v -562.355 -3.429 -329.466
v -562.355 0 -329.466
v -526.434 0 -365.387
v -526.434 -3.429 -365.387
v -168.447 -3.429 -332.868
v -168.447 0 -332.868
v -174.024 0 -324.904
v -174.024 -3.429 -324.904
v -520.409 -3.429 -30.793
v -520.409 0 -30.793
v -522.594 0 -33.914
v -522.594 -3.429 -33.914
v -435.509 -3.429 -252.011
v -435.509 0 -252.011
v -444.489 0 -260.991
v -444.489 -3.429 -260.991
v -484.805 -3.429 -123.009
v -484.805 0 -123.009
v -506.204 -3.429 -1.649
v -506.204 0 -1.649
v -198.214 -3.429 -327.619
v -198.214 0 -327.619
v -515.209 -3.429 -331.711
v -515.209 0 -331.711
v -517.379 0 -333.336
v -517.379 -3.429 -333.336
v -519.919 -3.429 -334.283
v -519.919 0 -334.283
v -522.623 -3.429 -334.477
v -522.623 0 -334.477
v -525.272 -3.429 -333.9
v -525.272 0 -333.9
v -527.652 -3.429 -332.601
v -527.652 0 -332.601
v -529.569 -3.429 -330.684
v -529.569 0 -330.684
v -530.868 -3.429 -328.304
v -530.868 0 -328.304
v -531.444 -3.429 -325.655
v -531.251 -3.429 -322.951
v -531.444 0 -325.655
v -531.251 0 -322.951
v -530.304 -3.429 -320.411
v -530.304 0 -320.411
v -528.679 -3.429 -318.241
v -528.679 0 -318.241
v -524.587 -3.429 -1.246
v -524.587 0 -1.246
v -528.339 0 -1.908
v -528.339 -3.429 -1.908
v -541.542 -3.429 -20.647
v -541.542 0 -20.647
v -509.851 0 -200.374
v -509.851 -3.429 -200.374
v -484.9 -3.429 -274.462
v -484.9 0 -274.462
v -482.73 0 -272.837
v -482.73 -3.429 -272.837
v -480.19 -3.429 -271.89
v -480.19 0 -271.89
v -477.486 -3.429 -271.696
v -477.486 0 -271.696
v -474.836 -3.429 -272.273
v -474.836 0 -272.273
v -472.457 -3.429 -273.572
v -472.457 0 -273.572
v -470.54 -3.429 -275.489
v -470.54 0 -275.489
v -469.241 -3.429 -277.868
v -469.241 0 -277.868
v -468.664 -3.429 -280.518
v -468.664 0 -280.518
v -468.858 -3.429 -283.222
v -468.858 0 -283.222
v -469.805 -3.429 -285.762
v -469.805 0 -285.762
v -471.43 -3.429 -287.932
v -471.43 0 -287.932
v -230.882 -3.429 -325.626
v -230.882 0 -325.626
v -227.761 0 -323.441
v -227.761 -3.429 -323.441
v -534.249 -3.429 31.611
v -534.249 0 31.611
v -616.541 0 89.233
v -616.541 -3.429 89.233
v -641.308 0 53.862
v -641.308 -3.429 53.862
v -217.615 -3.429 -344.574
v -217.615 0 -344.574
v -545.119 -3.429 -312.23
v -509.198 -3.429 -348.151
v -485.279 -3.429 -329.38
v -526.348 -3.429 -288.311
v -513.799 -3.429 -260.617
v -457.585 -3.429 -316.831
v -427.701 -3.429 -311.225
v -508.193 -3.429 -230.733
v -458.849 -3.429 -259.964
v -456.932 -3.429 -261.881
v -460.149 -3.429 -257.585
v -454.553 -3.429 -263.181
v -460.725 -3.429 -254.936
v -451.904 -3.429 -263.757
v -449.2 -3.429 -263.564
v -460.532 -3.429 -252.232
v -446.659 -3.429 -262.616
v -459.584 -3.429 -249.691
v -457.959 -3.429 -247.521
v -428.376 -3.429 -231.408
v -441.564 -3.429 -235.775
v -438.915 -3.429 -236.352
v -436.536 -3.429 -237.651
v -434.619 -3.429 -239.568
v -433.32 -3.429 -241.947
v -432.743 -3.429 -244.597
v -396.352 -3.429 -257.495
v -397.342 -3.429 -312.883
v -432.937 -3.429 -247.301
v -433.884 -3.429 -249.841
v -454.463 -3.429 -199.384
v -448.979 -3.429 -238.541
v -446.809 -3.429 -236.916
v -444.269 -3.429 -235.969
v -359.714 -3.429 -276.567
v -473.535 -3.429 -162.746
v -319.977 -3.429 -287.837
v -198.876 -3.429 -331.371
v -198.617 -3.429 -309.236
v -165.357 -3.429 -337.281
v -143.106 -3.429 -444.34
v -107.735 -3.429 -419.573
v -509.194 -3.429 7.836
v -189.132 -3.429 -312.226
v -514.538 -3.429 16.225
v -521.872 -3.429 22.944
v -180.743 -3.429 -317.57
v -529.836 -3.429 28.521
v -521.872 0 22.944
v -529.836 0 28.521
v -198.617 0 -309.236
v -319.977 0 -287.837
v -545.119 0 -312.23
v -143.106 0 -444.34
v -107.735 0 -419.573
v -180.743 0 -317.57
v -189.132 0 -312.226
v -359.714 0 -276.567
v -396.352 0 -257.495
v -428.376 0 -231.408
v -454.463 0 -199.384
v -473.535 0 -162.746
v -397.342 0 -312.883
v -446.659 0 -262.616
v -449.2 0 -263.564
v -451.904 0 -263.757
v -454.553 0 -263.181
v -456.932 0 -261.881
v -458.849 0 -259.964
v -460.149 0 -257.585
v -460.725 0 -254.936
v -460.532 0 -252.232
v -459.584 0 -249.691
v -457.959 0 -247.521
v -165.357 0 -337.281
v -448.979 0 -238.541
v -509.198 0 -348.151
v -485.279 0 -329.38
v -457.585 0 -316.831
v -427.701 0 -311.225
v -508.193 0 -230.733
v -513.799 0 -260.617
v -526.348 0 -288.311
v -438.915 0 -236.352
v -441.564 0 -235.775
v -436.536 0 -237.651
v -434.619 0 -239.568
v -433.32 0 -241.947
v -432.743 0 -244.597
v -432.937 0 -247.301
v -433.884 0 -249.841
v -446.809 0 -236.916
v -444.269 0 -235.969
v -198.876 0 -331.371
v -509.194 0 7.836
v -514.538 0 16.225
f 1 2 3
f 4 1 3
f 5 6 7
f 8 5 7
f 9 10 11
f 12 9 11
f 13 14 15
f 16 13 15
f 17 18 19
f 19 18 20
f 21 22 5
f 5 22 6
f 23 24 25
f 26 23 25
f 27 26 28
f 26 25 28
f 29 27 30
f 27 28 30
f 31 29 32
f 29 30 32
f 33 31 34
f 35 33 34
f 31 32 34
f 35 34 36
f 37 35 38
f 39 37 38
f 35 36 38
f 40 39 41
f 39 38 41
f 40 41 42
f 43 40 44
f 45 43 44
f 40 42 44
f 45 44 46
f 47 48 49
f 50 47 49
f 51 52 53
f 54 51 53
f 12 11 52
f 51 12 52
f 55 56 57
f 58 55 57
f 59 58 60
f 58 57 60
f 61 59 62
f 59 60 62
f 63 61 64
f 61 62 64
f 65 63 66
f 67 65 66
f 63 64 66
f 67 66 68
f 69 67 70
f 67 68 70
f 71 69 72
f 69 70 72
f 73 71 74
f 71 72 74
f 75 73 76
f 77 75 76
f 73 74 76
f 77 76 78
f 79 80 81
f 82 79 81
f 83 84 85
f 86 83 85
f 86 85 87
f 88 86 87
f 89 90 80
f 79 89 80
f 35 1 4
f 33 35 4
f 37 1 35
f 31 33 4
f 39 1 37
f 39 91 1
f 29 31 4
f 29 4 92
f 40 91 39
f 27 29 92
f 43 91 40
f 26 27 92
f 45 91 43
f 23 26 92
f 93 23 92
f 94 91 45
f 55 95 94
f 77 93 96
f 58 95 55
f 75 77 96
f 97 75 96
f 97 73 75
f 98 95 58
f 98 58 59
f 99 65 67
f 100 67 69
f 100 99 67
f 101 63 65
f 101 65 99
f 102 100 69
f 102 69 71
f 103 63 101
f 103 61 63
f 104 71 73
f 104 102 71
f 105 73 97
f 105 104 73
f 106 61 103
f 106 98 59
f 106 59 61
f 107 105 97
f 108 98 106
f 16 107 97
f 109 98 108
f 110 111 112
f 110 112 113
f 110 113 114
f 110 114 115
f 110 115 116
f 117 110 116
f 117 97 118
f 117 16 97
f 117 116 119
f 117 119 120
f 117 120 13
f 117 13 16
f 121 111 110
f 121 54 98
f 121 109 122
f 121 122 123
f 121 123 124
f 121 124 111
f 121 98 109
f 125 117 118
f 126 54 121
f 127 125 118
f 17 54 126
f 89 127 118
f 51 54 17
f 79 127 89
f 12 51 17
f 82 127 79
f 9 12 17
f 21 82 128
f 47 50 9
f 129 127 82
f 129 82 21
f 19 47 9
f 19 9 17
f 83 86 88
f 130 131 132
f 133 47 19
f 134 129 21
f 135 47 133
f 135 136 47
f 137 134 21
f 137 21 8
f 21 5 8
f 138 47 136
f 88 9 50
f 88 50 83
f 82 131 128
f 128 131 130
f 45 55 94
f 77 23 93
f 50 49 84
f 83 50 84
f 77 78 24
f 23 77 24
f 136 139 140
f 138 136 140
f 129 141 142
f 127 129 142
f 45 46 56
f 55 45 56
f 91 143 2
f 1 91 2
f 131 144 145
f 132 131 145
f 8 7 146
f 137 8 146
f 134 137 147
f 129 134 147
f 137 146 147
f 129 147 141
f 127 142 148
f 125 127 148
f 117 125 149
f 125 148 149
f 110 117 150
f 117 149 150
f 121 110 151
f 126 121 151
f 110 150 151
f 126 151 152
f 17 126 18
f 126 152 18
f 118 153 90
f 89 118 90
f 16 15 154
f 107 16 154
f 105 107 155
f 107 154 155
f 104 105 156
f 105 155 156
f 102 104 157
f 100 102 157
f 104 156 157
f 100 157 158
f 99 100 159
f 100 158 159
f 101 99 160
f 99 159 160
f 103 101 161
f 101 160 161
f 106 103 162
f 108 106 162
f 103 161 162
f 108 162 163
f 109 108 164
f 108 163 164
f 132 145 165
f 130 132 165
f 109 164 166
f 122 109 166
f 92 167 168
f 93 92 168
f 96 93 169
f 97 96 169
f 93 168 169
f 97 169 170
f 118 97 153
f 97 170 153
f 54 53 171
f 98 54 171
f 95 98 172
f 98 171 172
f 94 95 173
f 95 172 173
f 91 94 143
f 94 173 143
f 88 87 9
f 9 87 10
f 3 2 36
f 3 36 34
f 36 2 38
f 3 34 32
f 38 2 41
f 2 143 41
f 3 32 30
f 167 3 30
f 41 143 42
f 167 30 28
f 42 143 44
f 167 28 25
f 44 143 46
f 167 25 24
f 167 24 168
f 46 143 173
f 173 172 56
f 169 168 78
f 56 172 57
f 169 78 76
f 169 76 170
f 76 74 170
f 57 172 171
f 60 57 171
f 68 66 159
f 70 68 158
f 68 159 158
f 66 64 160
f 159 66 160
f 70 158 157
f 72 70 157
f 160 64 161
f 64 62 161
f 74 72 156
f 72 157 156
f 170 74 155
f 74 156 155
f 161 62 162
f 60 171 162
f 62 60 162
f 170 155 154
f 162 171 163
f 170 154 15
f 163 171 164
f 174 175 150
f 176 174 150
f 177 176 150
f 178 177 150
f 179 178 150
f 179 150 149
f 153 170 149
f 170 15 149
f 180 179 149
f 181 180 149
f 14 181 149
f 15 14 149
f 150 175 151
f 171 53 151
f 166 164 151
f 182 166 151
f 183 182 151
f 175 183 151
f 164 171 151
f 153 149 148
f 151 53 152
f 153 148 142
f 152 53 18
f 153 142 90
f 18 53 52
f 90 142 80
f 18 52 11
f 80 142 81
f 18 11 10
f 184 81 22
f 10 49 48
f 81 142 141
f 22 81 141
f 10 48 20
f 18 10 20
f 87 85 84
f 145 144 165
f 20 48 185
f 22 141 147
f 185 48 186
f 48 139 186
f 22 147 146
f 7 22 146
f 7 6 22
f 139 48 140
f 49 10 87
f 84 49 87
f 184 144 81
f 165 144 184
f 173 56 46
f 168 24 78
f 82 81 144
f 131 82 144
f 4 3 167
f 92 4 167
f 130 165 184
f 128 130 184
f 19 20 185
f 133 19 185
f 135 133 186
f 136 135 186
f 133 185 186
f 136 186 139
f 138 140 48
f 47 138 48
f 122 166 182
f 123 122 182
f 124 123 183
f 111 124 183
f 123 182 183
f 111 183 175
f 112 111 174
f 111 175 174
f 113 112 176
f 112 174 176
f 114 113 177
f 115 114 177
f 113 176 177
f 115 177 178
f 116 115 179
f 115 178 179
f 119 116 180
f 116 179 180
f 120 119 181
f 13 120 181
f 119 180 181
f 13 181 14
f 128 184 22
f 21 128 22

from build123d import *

# Parameters (mm, degrees)
F1_DEPTH = 3.429


# Not quite as in the source:
# - ends of sketch curves that miss each other by under 0.0002 mm in the source are joined


with BuildPart() as f1:
    # F0 (on Front) → F1 (new body)
    with BuildSketch(Plane.XZ):
        with BuildLine():
            Line((-198.875523, -331.3710416), (-198.2139038, -327.6189282))
            Line((-198.2139038, -327.6189282), (-168.4471104, -332.867635))
            Line((-168.4471104, -332.867635), (-174.023655, -324.9035158))
            ThreePointArc((-174.023655, -324.9035158), (-184.7622274276, -314.6235496681), (-198.6173544615, -309.2355853348))
            Line((-198.6173544615, -309.2355853348), (-319.9769826, -287.83661))
            ThreePointArc((-319.9769826, -287.83661), (-428.3757561371, -231.4077731371), (-484.8045910801, -123.0089992615))
            Line((-484.8045910801, -123.0089992615), (-506.203585, -1.649349))
            ThreePointArc((-506.203585, -1.649349), (-511.5915580136, 12.2057554868), (-521.8715008941, 22.9443250094))
            Line((-521.8715008941, 22.9443250094), (-529.835618, 28.5208726))
            Line((-529.835618, 28.5208726), (-524.5869112, -1.2459208))
            Line((-524.5869112, -1.2459208), (-528.33905, -1.9075146))
            Line((-528.33905, -1.9075146), (-534.2493252, 31.6113922))
            Line((-534.2493252, 31.6113922), (-616.5409056, 89.2325622))
            Line((-616.5409056, 89.2325622), (-641.3079376, 53.861589))
            Line((-641.3079376, 53.861589), (-520.4086366, -30.7930042))
            Line((-520.4086366, -30.7930042), (-522.5939764, -33.9139784))
            Line((-522.5939764, -33.9139784), (-541.541589, -20.6467202))
            Line((-541.541589, -20.6467202), (-509.8508218, -200.3739452))
            ThreePointArc((-509.8508218, -200.3739452), (-513.7993593908, -260.6169022992), (-545.1188511893, -312.2298278107))
            Line((-545.1188511893, -312.2298278107), (-562.3549332, -329.4659146))
            Line((-562.3549332, -329.4659146), (-526.4338976, -365.3869248))
            Line((-526.4338976, -365.3869248), (-509.1978386, -348.1508658))
            ThreePointArc((-509.1978386, -348.1508658), (-457.5849106992, -316.8313763908), (-397.341954706, -312.8828450725))
            Line((-397.341954706, -312.8828450725), (-217.6147032, -344.573606))
            Line((-217.6147032, -344.573606), (-230.8819614, -325.6259934))
            Line((-230.8819614, -325.6259934), (-227.7609872, -323.4406536))
            Line((-227.7609872, -323.4406536), (-143.106394, -444.3399292))
            Line((-143.106394, -444.3399292), (-107.7354208, -419.5728972))
            Line((-107.7354208, -419.5728972), (-165.3565908, -337.2813422))
            Line((-165.3565908, -337.2813422), (-198.875523, -331.3710416))
        make_face()
        with BuildLine():
            ThreePointArc((-484.9002250908, -274.4618325092), (-471.4298472592, -274.4618261592), (-471.4298282092, -287.9322039908))
            Line((-471.4298282092, -287.9322039908), (-515.2085708, -331.7109698))
            ThreePointArc((-515.2085708, -331.7109698), (-528.6789538908, -331.7109708908), (-528.6789538908, -318.2405867092))
            Line((-528.6789538908, -318.2405867092), (-484.9002250908, -274.4618325092))
        make_face(mode=Mode.SUBTRACT)
        with BuildLine():
            ThreePointArc((-448.9791894908, -238.5408223092), (-435.5088053092, -238.5408223092), (-435.5088053092, -252.0112064908))
            Line((-435.5088053092, -252.0112064908), (-444.4890526, -260.9914516))
            ThreePointArc((-444.4890526, -260.9914516), (-457.9594356908, -260.9914526908), (-457.9594356908, -247.5210685092))
            Line((-457.9594356908, -247.5210685092), (-448.9791894908, -238.5408223092))
        make_face(mode=Mode.SUBTRACT)
    extrude(amount=F1_DEPTH)


solid = f1.part
